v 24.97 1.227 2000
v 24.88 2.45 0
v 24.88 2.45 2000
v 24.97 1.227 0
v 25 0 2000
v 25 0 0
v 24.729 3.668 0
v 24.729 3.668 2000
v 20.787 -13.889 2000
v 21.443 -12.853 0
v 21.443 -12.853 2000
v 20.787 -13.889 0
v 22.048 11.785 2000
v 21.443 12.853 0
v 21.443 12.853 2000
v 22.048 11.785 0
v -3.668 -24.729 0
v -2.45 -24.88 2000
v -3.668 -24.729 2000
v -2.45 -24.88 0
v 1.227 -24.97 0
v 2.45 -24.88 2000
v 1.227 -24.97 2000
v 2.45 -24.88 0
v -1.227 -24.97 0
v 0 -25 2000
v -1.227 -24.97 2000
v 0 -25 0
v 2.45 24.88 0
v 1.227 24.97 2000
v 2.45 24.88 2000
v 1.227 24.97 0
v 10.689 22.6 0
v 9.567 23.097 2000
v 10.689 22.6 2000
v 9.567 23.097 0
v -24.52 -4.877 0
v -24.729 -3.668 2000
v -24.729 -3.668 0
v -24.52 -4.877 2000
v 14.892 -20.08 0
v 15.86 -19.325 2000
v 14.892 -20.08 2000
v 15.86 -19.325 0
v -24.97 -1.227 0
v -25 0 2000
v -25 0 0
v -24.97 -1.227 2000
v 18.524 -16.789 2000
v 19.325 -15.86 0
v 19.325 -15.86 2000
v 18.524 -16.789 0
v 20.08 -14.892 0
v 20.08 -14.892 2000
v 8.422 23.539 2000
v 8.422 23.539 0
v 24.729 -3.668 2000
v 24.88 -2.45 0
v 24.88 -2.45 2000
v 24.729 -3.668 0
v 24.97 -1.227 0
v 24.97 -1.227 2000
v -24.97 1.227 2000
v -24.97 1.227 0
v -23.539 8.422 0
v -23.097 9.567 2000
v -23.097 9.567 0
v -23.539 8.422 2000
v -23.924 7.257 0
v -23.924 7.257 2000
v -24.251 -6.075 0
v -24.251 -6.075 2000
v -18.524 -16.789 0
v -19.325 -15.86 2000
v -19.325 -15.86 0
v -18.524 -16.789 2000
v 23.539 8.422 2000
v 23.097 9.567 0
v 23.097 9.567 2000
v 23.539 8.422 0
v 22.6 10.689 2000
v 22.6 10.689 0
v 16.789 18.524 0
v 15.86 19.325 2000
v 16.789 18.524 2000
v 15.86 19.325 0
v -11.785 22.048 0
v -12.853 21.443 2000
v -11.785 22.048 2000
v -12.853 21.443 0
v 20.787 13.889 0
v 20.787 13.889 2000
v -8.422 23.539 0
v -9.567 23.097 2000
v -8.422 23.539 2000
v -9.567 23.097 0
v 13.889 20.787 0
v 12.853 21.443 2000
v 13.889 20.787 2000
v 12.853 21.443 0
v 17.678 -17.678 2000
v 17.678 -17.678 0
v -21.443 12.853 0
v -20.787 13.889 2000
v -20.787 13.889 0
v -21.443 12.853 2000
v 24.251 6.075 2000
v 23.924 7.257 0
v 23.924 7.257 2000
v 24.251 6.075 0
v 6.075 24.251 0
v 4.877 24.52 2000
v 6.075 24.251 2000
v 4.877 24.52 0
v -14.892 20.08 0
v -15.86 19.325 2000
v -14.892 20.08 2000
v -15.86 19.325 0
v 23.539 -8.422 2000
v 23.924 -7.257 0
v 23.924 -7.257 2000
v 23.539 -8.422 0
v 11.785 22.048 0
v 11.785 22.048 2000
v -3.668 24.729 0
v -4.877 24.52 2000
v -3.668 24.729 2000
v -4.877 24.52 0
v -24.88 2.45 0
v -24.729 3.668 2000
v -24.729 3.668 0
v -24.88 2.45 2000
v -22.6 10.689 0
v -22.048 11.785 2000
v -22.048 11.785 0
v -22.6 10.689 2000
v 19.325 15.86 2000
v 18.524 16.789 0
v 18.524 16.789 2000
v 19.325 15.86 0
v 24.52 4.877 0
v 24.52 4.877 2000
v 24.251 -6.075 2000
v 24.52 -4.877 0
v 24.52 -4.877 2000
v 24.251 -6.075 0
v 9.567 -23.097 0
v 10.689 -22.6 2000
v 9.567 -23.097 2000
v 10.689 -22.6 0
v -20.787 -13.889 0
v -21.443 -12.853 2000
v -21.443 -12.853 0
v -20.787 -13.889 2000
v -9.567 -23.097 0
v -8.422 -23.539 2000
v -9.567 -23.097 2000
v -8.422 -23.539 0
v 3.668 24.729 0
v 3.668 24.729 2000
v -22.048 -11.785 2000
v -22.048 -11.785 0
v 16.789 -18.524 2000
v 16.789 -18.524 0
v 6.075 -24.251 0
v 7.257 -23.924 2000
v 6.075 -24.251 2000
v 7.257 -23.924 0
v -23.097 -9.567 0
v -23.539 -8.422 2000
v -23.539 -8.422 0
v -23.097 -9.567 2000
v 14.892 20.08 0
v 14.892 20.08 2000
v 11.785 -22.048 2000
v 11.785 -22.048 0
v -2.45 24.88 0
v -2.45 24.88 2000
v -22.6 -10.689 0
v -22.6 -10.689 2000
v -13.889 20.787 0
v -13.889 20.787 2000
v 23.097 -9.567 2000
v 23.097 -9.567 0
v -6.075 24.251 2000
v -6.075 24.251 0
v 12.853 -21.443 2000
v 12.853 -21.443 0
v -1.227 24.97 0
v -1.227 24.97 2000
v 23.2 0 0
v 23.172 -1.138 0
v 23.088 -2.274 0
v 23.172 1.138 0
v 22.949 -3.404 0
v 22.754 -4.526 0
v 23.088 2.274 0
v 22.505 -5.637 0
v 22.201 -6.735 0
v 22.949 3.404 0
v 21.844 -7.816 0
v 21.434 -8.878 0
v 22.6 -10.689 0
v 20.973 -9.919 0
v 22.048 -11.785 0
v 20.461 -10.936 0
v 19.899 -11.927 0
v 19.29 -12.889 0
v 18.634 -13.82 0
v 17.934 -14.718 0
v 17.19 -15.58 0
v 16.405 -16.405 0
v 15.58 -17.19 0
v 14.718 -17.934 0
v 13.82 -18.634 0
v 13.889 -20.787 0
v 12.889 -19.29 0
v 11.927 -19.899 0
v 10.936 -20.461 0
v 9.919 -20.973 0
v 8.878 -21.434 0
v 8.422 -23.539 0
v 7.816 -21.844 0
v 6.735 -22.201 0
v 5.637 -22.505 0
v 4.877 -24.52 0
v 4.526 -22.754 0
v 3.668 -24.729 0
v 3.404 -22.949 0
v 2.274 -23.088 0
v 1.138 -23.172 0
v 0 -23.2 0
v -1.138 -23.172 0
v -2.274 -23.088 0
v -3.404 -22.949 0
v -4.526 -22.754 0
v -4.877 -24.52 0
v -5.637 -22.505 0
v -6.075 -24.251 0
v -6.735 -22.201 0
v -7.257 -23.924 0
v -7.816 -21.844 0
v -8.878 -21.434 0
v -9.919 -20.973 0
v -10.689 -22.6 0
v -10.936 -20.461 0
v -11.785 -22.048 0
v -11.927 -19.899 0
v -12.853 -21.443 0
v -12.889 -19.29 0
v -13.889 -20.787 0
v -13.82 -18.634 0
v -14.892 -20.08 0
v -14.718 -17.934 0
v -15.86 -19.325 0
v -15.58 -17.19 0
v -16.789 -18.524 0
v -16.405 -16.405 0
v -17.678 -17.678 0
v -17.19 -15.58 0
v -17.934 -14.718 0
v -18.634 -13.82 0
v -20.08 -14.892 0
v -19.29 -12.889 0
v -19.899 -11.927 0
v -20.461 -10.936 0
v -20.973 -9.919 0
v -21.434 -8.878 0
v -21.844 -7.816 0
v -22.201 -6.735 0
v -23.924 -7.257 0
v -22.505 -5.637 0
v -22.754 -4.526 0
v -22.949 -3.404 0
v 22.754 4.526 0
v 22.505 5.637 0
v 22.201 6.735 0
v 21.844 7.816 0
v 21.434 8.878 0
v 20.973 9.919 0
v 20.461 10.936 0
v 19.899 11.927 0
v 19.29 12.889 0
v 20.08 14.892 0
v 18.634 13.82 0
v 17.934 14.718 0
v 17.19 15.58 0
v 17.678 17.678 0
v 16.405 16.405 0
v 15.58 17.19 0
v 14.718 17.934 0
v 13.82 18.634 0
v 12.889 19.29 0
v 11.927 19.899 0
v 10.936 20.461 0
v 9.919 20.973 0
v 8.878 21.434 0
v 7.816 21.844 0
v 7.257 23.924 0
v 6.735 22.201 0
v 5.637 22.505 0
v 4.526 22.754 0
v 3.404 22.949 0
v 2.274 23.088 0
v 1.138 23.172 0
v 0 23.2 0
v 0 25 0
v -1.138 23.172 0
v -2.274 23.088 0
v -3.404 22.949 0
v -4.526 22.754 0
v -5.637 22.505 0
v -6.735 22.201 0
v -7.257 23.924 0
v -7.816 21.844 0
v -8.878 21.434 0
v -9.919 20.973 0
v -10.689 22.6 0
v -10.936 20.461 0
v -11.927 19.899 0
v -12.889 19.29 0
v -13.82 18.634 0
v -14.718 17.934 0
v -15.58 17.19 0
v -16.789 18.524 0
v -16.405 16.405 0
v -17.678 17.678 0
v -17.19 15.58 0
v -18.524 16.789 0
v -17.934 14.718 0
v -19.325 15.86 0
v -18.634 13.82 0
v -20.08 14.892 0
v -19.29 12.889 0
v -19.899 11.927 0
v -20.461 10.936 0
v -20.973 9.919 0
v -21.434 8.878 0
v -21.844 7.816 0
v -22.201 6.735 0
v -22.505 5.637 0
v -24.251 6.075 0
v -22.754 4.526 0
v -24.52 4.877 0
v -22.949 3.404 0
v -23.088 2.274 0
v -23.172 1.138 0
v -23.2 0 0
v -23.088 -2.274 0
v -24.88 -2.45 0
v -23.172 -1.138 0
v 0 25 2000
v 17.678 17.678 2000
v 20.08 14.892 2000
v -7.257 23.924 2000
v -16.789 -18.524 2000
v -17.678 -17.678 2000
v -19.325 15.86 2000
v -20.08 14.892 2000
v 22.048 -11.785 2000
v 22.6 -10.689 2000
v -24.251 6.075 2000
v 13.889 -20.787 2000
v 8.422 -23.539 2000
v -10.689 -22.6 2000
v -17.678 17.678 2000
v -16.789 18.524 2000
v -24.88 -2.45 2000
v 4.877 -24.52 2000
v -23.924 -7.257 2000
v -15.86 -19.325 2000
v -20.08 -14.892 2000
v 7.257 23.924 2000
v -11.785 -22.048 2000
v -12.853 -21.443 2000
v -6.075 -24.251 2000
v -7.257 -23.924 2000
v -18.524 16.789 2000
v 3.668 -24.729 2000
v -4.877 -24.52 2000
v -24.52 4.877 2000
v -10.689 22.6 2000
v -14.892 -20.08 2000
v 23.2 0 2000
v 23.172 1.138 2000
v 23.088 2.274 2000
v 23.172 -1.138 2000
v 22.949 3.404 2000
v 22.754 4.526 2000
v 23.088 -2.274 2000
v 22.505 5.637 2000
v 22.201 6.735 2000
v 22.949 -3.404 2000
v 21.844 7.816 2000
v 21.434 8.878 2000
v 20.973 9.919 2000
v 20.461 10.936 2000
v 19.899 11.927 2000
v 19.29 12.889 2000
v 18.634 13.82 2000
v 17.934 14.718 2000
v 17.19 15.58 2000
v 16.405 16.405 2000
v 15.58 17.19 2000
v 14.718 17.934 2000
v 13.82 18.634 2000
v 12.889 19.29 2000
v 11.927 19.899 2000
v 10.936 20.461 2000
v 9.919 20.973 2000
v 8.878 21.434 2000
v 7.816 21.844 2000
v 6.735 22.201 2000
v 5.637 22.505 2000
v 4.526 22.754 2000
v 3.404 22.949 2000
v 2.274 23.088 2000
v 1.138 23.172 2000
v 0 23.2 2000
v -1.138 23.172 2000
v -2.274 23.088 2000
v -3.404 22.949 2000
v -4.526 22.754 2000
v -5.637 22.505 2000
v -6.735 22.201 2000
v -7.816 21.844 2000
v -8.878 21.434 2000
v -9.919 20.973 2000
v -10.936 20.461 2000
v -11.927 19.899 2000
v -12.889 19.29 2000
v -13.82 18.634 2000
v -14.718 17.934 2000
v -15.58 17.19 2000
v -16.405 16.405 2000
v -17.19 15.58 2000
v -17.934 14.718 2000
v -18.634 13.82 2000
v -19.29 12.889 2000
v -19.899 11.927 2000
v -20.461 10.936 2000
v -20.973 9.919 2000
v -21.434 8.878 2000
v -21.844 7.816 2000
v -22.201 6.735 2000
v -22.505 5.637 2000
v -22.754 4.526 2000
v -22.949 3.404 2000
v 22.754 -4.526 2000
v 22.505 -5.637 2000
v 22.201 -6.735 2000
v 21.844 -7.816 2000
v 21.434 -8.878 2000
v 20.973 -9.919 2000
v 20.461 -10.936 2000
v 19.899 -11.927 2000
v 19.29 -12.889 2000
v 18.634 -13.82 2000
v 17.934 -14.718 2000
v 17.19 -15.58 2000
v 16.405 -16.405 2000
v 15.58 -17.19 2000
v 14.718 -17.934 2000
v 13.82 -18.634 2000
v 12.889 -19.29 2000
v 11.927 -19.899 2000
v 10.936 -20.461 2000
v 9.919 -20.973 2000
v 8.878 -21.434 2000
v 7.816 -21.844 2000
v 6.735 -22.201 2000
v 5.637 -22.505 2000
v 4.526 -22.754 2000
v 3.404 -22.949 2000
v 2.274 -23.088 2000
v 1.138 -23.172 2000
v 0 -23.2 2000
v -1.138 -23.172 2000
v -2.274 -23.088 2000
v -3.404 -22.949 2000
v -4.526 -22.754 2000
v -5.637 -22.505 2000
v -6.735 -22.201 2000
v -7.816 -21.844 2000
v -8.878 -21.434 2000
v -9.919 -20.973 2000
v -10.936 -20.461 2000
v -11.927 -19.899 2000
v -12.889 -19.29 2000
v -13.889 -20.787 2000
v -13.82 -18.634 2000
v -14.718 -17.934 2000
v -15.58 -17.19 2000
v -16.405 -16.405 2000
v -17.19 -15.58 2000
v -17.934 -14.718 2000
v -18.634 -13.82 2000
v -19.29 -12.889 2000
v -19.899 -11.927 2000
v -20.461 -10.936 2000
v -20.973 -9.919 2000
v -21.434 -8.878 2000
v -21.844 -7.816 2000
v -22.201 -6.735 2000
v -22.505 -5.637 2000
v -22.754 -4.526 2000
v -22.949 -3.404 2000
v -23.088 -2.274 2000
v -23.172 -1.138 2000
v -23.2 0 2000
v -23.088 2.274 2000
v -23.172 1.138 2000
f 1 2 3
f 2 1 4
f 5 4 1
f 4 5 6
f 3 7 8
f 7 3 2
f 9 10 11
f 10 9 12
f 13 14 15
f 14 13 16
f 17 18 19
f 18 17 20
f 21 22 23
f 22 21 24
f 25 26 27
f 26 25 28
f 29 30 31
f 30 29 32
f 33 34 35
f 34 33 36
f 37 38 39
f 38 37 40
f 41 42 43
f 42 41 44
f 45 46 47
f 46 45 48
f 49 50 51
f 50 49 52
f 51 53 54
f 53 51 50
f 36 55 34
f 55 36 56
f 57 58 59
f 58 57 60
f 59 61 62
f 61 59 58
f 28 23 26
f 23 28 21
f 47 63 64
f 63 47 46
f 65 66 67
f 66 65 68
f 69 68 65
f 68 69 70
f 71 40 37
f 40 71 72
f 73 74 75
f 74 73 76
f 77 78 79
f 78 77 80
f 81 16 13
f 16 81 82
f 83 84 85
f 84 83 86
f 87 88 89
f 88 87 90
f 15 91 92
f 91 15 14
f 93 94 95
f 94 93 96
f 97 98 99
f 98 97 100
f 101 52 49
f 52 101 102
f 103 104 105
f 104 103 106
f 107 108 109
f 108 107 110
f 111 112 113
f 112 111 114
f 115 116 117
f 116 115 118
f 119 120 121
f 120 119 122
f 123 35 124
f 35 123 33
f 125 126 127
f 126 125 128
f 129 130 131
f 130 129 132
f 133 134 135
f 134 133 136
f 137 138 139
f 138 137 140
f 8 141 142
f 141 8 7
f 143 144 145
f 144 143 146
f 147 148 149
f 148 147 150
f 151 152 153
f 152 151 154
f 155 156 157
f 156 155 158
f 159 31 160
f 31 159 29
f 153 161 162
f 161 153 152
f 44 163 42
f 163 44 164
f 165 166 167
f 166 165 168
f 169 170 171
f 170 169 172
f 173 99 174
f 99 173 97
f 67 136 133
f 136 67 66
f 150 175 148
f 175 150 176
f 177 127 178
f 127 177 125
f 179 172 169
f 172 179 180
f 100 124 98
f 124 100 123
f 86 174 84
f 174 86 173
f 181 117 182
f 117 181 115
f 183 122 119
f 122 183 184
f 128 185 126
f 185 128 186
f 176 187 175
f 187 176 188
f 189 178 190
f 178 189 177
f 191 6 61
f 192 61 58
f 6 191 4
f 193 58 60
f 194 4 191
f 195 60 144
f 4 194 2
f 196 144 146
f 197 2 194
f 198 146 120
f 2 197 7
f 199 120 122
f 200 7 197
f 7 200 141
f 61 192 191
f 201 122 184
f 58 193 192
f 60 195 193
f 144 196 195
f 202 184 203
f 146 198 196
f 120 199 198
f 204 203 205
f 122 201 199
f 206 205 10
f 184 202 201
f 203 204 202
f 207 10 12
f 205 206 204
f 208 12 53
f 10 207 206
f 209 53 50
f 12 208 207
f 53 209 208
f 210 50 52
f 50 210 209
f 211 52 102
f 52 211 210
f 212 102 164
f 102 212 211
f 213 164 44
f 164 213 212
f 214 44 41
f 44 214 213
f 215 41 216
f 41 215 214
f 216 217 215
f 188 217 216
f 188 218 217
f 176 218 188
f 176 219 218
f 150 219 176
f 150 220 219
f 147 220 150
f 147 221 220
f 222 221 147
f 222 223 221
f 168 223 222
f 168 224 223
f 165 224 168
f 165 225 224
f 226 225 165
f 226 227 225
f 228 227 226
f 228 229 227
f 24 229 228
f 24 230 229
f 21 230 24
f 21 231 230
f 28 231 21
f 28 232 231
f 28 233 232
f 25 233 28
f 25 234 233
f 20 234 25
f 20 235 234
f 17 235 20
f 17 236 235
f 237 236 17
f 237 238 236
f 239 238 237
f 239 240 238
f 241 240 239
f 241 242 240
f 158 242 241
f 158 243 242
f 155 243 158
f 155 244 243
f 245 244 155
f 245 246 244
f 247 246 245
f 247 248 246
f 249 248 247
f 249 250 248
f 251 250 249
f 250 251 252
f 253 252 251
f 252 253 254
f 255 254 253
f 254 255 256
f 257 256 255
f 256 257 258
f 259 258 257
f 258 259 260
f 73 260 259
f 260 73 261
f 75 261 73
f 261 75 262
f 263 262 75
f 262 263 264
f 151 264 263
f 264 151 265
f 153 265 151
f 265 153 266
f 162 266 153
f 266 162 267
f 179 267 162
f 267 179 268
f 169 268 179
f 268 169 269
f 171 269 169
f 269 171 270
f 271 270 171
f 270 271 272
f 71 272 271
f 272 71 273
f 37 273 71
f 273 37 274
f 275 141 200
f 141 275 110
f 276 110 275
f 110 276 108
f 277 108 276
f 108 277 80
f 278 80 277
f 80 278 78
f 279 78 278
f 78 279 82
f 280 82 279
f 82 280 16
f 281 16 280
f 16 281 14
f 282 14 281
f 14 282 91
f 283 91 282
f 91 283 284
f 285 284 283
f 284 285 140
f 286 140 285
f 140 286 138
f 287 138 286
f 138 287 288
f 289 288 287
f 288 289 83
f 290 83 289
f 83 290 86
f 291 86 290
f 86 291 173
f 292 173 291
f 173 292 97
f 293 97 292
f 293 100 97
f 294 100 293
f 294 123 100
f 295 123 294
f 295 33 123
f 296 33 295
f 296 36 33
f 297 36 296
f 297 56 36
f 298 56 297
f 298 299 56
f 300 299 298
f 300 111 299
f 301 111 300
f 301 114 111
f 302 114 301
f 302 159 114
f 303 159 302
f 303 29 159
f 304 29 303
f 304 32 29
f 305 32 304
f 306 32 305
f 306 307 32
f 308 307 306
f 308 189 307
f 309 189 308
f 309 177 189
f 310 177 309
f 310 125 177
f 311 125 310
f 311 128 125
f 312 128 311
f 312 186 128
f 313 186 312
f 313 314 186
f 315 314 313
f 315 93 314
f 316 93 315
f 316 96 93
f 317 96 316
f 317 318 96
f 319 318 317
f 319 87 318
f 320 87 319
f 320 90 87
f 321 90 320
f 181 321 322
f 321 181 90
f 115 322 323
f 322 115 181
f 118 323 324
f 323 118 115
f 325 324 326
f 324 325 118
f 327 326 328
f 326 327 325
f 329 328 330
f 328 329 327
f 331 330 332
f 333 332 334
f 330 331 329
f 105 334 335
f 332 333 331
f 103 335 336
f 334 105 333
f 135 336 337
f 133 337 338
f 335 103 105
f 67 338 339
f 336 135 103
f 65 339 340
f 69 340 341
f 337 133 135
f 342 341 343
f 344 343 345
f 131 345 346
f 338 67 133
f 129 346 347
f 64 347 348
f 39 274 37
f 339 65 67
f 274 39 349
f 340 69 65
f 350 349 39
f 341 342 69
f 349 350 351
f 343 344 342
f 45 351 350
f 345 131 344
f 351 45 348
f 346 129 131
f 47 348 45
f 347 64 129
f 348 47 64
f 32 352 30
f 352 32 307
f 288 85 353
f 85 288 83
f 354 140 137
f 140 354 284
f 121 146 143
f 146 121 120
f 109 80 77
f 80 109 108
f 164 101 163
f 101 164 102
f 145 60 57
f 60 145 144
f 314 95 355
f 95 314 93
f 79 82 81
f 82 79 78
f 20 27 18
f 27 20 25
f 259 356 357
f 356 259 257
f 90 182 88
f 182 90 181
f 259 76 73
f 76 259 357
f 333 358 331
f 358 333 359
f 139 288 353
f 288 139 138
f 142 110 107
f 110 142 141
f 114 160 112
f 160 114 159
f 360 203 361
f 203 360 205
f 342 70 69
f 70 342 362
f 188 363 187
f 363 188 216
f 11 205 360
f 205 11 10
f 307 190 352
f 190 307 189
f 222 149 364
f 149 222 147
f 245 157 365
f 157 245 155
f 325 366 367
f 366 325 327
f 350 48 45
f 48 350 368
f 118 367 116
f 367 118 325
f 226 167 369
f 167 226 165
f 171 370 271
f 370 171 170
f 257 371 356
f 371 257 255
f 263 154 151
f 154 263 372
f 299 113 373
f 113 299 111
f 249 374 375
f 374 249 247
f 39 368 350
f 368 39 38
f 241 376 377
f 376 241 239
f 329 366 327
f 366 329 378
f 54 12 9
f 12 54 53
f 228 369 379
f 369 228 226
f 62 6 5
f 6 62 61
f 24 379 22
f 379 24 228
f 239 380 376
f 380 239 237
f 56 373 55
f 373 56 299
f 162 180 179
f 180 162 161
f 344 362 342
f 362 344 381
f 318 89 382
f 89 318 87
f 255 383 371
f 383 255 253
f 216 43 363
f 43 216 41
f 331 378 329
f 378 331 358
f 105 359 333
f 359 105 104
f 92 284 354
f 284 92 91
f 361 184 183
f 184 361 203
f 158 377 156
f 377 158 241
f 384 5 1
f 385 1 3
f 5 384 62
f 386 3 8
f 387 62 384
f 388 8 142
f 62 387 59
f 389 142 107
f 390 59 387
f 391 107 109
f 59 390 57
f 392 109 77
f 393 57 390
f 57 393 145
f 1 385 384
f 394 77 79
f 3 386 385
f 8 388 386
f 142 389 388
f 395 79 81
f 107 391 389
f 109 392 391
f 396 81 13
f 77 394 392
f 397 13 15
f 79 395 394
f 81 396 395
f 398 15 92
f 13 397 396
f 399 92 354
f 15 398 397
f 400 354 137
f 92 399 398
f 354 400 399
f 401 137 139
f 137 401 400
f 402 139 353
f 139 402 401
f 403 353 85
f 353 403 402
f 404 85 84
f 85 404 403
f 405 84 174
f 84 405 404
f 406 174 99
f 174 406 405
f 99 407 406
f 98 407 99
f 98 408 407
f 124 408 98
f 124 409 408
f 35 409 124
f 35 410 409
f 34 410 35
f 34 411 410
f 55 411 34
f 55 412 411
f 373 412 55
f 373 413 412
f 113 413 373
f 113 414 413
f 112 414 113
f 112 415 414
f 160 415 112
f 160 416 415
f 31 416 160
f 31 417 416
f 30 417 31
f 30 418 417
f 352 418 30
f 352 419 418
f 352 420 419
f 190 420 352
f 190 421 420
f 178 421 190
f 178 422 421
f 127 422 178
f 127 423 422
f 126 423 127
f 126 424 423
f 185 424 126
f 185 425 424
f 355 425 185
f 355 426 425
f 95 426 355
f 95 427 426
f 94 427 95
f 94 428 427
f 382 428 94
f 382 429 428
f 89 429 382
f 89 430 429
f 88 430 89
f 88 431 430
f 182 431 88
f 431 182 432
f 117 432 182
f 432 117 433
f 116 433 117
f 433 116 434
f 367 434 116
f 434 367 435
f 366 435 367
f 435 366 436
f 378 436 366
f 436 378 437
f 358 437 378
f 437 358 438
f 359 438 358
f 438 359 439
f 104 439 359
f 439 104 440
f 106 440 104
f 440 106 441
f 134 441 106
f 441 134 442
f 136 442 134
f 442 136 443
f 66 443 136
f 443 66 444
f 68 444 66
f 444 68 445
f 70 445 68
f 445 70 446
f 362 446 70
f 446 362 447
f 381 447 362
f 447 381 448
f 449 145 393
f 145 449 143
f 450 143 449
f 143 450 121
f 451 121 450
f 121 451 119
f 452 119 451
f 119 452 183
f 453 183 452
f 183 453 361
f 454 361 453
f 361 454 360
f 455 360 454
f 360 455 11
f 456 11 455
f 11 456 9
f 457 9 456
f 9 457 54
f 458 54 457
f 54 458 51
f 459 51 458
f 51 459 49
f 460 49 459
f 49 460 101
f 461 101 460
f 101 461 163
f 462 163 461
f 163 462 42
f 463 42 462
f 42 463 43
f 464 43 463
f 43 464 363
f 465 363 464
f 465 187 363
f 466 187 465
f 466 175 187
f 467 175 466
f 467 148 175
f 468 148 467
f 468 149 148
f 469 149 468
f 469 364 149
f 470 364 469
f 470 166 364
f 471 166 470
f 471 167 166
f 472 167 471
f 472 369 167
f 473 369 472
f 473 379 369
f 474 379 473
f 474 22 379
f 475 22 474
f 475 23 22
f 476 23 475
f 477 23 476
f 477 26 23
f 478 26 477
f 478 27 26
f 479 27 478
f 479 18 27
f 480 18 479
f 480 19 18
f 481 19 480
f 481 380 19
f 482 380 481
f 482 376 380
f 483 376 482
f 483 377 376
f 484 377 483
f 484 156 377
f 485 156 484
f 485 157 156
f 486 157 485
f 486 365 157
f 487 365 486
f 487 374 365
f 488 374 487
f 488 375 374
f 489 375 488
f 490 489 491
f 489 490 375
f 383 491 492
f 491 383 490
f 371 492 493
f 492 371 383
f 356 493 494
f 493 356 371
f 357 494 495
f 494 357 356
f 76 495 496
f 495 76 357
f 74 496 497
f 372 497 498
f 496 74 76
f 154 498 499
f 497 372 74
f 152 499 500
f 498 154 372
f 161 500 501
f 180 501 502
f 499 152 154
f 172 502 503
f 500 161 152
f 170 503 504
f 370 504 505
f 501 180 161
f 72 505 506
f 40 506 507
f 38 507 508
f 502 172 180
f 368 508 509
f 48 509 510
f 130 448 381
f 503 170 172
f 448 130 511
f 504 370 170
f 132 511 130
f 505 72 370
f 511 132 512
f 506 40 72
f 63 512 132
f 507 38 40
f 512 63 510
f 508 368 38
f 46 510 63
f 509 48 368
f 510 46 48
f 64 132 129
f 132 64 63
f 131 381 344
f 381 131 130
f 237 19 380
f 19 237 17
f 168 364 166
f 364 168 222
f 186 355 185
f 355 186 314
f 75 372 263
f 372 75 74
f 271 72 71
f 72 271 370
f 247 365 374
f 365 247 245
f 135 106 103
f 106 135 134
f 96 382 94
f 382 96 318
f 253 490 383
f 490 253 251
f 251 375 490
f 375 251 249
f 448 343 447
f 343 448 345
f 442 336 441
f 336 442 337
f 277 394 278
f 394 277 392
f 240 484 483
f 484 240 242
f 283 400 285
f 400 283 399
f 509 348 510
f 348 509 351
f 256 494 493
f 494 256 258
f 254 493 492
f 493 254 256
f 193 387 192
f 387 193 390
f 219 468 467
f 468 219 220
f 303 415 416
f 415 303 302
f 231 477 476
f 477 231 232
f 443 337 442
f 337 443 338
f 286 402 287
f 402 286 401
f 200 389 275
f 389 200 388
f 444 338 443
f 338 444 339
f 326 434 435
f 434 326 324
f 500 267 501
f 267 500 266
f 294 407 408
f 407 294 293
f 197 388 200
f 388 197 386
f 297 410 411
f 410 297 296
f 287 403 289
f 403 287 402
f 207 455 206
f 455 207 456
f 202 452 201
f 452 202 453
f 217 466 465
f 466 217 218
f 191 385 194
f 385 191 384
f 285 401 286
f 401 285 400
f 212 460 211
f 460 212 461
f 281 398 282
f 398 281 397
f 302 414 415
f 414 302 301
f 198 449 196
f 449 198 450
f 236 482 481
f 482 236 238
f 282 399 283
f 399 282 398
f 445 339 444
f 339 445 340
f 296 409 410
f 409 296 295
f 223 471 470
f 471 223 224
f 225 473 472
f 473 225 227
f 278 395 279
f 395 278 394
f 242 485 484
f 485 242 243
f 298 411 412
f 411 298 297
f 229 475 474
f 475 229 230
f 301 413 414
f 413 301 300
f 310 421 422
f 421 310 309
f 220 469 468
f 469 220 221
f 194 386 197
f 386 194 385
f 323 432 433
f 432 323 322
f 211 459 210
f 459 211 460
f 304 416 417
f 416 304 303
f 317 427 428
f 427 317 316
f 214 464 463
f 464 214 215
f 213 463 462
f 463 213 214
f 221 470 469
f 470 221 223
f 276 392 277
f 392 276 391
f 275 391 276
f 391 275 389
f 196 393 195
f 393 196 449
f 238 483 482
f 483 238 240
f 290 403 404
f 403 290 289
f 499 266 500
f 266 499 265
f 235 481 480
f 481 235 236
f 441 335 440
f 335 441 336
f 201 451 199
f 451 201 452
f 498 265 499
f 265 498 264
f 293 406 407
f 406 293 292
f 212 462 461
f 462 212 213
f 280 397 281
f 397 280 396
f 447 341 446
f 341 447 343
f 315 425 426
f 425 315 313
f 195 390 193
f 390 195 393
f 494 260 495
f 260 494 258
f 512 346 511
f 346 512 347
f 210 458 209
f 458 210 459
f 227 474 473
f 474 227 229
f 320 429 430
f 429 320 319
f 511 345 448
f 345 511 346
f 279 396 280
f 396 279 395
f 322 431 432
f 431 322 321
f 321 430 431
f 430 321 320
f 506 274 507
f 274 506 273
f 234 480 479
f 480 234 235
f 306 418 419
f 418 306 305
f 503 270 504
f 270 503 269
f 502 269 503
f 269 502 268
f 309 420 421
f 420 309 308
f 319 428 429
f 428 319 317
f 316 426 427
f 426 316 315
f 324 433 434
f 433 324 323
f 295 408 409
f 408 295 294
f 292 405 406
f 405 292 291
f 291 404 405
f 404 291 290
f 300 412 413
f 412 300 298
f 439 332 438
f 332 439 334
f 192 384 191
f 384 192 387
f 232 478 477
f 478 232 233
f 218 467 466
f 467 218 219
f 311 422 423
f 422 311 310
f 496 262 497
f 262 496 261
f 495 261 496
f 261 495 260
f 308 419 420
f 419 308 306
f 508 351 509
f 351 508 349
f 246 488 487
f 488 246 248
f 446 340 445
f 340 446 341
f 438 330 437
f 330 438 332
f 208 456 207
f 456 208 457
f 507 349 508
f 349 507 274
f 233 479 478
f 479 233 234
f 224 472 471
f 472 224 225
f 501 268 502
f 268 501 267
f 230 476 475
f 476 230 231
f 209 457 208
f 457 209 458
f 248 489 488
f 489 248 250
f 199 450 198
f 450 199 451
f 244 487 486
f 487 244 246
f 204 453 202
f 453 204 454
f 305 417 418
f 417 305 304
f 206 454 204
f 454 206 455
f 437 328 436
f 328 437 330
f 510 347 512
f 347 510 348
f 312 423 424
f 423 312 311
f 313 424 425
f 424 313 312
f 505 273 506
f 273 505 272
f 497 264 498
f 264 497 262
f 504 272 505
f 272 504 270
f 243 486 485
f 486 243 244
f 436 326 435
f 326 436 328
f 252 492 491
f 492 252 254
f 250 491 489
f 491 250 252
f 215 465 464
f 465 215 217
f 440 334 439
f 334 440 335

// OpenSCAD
$fn = 128;

// HT 50 pipe (approx.): OD 50 mm, wall 1.8 mm, length 2000 mm
od = 50;
wall = 1.8;
id = od - 2*wall;
len = 2000;

module ht_pipe(od, id, len) {
    difference() {
        cylinder(h = len, d = od, center = false);
        translate([0,0,-0.1])
            cylinder(h = len + 0.2, d = id, center = false);
    }
}

ht_pipe(od, id, len);
